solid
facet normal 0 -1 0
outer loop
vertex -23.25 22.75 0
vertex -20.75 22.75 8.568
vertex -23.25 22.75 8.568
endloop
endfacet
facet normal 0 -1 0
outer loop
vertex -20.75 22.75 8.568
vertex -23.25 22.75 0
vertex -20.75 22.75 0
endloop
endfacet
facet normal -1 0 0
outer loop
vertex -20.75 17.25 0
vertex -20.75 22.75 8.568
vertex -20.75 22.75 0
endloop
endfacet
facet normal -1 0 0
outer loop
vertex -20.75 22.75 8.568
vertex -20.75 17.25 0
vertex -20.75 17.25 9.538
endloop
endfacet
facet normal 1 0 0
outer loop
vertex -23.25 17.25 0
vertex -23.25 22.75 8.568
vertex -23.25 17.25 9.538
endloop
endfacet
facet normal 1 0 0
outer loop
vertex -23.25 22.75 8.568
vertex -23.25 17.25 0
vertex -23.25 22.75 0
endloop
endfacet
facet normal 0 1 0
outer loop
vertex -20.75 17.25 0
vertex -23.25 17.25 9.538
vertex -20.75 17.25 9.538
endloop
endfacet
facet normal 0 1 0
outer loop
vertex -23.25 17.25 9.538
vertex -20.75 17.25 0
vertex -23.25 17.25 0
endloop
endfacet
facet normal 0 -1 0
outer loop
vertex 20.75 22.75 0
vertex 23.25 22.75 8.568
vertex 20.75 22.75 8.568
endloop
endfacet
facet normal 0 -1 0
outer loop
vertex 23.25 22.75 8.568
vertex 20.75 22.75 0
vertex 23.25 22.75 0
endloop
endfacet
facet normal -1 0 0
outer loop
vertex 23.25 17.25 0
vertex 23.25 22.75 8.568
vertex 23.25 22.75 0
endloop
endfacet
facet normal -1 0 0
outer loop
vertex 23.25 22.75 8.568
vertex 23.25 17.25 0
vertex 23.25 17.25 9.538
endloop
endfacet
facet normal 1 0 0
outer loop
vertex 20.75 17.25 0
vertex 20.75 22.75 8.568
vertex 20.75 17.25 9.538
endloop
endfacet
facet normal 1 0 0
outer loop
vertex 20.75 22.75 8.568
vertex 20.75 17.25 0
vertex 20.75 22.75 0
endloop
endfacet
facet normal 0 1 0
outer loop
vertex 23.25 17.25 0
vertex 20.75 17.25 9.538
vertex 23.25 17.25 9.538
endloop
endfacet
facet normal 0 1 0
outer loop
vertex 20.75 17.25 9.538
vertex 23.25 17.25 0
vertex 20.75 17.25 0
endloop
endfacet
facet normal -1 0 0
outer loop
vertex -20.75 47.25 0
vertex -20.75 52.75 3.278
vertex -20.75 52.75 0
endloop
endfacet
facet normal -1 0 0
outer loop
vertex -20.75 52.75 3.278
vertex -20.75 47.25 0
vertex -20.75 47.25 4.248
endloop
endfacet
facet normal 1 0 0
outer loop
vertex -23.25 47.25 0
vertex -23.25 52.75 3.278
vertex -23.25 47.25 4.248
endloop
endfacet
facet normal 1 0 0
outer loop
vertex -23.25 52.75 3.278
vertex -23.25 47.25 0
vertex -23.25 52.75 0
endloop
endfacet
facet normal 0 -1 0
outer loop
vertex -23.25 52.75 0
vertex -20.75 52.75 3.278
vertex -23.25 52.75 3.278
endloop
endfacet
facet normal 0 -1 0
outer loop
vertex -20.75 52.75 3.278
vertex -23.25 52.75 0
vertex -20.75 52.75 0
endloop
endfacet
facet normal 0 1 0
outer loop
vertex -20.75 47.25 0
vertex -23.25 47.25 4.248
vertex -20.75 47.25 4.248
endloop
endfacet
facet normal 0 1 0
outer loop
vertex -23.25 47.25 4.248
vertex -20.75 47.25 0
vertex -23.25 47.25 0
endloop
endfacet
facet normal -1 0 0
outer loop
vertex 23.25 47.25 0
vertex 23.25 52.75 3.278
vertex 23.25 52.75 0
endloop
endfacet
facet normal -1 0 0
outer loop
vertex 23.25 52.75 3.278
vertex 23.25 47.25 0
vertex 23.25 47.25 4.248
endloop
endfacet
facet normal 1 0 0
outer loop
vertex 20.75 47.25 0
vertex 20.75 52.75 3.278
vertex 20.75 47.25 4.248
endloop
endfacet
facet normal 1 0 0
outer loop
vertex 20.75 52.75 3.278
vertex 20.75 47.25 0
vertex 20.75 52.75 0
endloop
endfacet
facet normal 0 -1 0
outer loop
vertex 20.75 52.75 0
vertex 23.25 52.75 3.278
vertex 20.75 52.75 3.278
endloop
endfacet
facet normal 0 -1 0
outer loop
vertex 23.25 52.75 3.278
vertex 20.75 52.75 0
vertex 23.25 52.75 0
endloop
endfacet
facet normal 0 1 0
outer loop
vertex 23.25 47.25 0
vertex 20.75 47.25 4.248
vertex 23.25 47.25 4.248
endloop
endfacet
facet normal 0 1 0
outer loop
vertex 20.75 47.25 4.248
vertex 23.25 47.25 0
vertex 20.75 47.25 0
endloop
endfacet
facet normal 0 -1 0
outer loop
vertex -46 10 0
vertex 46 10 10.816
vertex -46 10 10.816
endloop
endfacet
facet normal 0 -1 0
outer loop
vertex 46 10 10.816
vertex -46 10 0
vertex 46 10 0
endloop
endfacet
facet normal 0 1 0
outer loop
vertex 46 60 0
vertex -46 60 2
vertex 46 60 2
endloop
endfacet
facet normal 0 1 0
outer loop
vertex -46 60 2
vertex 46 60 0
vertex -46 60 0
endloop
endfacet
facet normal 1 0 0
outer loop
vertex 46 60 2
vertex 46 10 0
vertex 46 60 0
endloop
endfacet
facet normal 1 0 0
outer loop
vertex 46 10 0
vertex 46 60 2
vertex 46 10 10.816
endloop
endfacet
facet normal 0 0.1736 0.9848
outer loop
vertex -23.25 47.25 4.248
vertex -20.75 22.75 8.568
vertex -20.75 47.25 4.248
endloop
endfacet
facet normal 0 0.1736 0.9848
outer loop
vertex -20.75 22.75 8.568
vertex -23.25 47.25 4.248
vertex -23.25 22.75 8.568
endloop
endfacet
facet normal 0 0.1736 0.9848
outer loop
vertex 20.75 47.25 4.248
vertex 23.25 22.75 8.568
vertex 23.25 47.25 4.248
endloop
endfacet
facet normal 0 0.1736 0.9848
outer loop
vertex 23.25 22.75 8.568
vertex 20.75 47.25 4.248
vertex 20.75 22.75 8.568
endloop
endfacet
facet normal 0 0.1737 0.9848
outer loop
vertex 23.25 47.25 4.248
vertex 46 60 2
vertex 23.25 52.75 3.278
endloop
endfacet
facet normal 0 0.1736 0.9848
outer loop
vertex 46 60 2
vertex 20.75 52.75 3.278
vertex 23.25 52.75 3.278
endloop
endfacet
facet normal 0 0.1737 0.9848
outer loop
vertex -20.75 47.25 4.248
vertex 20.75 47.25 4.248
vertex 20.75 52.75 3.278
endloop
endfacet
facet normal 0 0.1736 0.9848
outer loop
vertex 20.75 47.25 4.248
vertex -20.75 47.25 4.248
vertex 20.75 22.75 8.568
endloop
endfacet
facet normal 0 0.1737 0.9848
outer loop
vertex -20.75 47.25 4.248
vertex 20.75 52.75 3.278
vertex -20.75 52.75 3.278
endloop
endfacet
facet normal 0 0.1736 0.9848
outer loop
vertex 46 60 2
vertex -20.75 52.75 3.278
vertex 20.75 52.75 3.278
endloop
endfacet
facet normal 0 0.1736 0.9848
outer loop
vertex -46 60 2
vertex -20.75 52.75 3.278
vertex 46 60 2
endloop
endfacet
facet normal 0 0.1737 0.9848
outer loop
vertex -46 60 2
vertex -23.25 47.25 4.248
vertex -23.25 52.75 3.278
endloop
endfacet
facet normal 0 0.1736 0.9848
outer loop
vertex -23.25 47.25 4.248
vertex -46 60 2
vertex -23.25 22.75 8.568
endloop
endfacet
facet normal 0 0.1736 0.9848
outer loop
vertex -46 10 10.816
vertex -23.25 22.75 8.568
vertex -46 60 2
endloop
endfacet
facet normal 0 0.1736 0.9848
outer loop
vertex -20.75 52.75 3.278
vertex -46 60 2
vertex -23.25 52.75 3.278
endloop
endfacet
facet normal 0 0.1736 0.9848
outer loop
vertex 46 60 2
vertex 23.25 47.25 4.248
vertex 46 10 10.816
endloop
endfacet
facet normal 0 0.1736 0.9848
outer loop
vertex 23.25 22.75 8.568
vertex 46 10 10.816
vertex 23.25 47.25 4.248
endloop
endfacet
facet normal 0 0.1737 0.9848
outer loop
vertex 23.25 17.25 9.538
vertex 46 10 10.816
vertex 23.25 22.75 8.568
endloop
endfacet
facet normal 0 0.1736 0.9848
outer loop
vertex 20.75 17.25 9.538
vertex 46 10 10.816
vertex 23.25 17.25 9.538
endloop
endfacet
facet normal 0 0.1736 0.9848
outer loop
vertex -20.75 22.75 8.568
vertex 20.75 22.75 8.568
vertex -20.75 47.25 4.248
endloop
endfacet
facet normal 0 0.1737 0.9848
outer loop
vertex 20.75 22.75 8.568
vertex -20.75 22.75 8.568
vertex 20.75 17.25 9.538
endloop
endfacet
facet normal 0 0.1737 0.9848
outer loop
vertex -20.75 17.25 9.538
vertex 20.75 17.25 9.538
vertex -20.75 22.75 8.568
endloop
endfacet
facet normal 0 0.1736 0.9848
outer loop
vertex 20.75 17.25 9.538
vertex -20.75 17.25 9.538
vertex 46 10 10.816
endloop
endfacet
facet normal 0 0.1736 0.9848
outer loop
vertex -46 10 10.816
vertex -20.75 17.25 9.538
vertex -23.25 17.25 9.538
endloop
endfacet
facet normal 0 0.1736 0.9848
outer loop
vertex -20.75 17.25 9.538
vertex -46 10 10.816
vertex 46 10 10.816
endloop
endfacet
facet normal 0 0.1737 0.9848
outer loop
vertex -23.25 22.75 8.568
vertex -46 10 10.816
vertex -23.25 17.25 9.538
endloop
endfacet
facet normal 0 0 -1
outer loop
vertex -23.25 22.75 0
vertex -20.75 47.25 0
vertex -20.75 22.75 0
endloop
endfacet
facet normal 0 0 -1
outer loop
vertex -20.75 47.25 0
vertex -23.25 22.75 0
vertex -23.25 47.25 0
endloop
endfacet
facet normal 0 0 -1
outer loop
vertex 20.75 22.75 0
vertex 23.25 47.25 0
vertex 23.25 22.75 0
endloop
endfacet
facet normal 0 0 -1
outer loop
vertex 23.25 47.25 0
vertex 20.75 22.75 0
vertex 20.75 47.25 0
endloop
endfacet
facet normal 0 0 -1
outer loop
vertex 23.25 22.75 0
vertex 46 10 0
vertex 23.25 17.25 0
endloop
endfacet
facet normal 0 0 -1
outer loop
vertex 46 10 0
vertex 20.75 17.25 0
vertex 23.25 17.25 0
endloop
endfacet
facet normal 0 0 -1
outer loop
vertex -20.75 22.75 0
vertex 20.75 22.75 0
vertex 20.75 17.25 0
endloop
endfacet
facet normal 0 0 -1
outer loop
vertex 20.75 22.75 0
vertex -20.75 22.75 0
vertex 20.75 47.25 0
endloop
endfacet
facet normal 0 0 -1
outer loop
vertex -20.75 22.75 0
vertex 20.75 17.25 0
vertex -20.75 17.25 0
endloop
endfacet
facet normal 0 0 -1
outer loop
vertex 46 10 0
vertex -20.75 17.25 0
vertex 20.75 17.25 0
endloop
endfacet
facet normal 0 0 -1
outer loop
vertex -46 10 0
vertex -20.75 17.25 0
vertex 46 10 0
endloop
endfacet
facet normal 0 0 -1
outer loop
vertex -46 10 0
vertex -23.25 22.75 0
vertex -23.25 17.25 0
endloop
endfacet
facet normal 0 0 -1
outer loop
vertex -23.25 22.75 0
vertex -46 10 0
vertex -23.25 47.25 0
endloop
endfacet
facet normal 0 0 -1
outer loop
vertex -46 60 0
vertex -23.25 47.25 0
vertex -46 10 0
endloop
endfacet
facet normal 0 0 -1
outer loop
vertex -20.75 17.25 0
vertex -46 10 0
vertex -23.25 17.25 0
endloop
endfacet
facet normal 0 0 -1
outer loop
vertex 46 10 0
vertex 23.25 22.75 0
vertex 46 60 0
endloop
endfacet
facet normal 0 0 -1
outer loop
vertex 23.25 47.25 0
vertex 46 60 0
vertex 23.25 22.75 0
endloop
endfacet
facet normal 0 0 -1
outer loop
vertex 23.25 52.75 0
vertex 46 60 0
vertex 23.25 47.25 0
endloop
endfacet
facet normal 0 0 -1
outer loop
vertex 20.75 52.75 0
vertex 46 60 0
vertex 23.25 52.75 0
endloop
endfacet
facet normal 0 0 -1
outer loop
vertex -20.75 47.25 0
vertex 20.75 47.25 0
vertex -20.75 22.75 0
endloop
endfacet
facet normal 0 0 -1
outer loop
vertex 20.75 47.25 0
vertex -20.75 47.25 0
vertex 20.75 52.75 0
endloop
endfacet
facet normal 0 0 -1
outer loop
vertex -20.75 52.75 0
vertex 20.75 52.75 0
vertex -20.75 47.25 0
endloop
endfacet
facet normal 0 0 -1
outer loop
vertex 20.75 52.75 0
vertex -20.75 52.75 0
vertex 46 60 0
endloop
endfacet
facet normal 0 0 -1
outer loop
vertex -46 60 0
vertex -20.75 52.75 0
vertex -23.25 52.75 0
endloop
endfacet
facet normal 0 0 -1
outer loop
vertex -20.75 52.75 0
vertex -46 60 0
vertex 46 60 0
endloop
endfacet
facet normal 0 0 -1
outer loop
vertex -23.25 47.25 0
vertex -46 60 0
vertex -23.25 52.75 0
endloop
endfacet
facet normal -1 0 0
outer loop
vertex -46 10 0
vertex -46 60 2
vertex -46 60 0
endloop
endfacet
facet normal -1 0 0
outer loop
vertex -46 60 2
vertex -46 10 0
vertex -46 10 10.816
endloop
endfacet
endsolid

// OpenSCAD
// file: ../sharedDims.scad
$fn=180;

/* [Printer] */
printBed            = 200;

/* [Hardware] */
m3InsertD           = 4.0;  //M3 heat-set insert hole -- check your insert's datasheet
m3InsertDepth       = 6.2;  //for a 5.7 mm long insert, plus a little for melt-back
m4InsertD           = 5.0;
m4InsertDepth       = 8.0;

/* [Shaft Adapter] */
adapterDia      = 20;
pinLatOffset    = 6;
numPins         = 2;

//overall
clDist              = 60;

/* [Hopper] */
wallThickness   = 5;
baseThickness   = 8;
hopperWidth     = 100;
hopperHeight    = 50;
hopperDepth     = 60;
hopperConvergeAngle       = 30;
dropHoleSize    = 30;
mountAngle      = 45;
//NEMA17 motor dimensions
shaftSquareDim      = 3;
shaftDia            = 5;
shaftDwidth         = 4.5;
flatLength          = 12;
motorHolePatternX   = 31;
motorHolePatternY   = 31;
motorClearanceCircle= 23;

/* [Singulator] */
singulatorDiameter      = 80;
singulatorExposureAngle = 90;
numHoles                = 4;
caseCutout              = 10;

/* [Funnel] */
topDia              = 40;
exitDia             = 20;
funnelHeight        = 30;

/* [Movable Support] */
supportScrewSize    = 6.6;
supportThickness    = 6;
cabinetWallThk      = 6;  //cabinet faces (ply or print); the servo mount bolts to the inside of the left panel
cornerBlock         = 20; //printed blocks in the cabinet's vertical corners -- at the base, the tile seam and
                          //the top; every wall screws into them
tileLap             = 16; //where a printed wall's two tiles meet: a half-lap this tall, glued and screwed

//MG90S servo -- typical numbers, measure yours
servoBodyL          = 22.8; //case length, along the ears
servoBodyW          = 12.2;
servoBodyH          = 22.7; //case bottom to case top, not counting the output boss
servoShaftToEnd     = 6.1;  //output shaft centre to the short end of the case
servoEarSpan        = 32.2; //tip to tip of the mounting ears
servoEarHolePitch   = 27.8;
servoEarThk         = 2.5;
servoEarDrop        = 4.0;  //case top down to the top face of the ears
servoWallClear      = 1.2;  //air between the servo's wall-side ear and the inside of the cabinet wall
servoEarsToArm      = 13.5; //measured: the servo mount's top face (the ears' underside) up to the arm's underside, horn on
//distance from the outside wall of the box to the servo's axis: the wall, then as far as the
//wall-side ear reaches from the shaft (half the ear span, less the case centre's offset
//behind the shaft), then the clearance. It has to come after the servo numbers it uses.
servoBackset        = cabinetWallThk + (servoEarSpan/2 - (servoBodyL/2 - servoShaftToEnd)) + servoWallClear;

//stack spacing down the drop axis
dropToFunnelRim     = 18;   //discharge exit down to the funnel's top rim
funnelToCoil        = 15;   //funnel exit down to the centre of the coil
maxCaseLen          = 69.2; //the longest case it takes (.338 Lapua Mag); shorter ones ride up the thumbscrew
funnelToCase        = maxCaseLen + 7;   //funnel exit down to the thumbscrew head at its lowest: the longest
                                        //case, with its mouth clear of the funnel
caseToArm           = 16;   //thumbscrew head at its lowest down to the top face of the horn arm

/* [Heatsink Holder] */
//induction heater heatsinks -- the pair on the heatsink holder, inside the cabinet; the coil's
//leads come through the wall and plug into them, and the transformer's cables leave the far end
heatsinkSpacing     = 20;   //between their flat faces: the holder's width across them
heatsinkH           = 54;   //overall, across the fins
heatsinkFinReach    = 5.25; //the fins stand this far proud of the flat face, toward the holder
heatsinkDepth       = 18.5; //flat face out to the back of the curved base (round, not square -- see layout)
heatsinkLen         = 38;   //extrusion length, the same as the holder
heatsinkBoreIn      = 7;    //the coil's lead plugs in this far in from the flat face, at mid-height

//the driver board's fan -- a standard 40 x 20
driverFanSize       = 40;   //square
driverFanDepth      = 20;
driverFanHolePitch  = 32;   //between its screw holes (M3)

//induction coil leads, where they pass through the cabinet wall
coilTube            = 4;    //copper tube OD
leadGap             = heatsinkSpacing + 2*heatsinkBoreIn;   //centre-to-centre: the heatsinks' lead bores
grommetLip          = 2.5;  //the pass-through is grown by this for the grommet
wallBackset         = 0; 
// file: transformerCradle.scad
include <../sharedDims.scad>

// Cradle for the harvested heater's transformer: a bridge over the driver
// board. A slab lies under the transformer, its top face along the
// transformer's underside, on a leg either side of the board down to the
// cabinet floor, where M3 screws come up into heat-set inserts in the feet.
// Two zip ties go over the transformer and down through the slab either
// side of it; snug slots keep them from sliding, and they're all that holds
// the transformer along its slope.
//
// The shim: the cradle was drawn for a shallower transformer. To steepen it
// without reprinting, a wedge on the slab tips it on to shimTilt, the tie
// slots running through both. Its own part is transformerShim.scad.
//
// Prints on the slab's top face: the slab spans leg to leg within its
// layers, and the legs are walls carrying the load straight down. Their
// edges lean 45 deg; the tie slots come out vertical.
//
// Frame: X front to back as in the assembly, but centred on the
// transformer's axis; Y to the right, along its run; Z up. The origin is on
// the floor under the centre of its left (upper) end face. Everything under
// "keep in step" has to match cad/cabinet/boxLayout.scad, which checks it.

/* [Transformer and board -- keep in step with boxLayout.scad] */
xfmrD      = 63.5;  // transformer diameter...
xfmrLen    = 90;    // ...and length
tilt       = 15;    // its axis, below horizontal
endH       = 101;   // its axis above the floor, at its left (upper) end face
boardTopH  = 44;    // the driver board's top above the floor (it lies under the transformer)...
boardHalfW = 22;    // ...and its farther edge from the axis

/* [Cradle] */
slabT     = 8;
slabFrom  = 10;     // along the transformer from its left end...
slabTo    = 60;     // ...to here, where the legs end -- any further and the slab drops onto the board
legTo     = 60;     // the legs carry the slab this far along (no further than slabTo)
legX      = [38, 46];   // each leg, off the axis
footLen   = 45;     // along Y, on the floor

/* [Shim -- keep shimTilt in step with boxLayout.scad's xfmrDown] */
shimTilt  = 25;     // the transformer's axis on the shim, below horizontal
shimThin  = 2;      // the wedge at its lower end

/* [Zip ties] */
tieW      = 5.5;    // slot along the transformer, for ties up to ~4.8 wide (a tie over the
tieT      = 2.5;    // transformer lies flat on it)... and across, for ties up to ~1.3 thick
tieAt     = [20, 50];   // along the transformer from its left end -- on the slab, 10 in from each end
tieX      = 22;     // either side of the axis

r = xfmrD/2;
slabLow = endH - slabTo*sin(tilt) - (r + slabT)*cos(tilt);   // the slab's lowest point, above the floor
assert(slabLow >= boardTopH + 3, "the slab drops onto the driver board");
assert(endH - xfmrLen*sin(tilt) - r*cos(tilt) >= boardTopH + 3, "the transformer's lower end drops onto the driver board");
assert(legTo <= slabTo, "the legs run past the slab");
assert(min(tieAt) - tieW/2 >= slabFrom + 3 && max(tieAt) + tieW/2 <= slabTo - 3, "the zip tie slots run off the slab");
assert(legX[0] >= boardHalfW + 2, "the legs run into the driver board");
assert(legX[0] > r + 2, "the legs run into the transformer");
// the feet, along Y: centred under the legs' stretch of the slab
footMidY = ((slabFrom + legTo)/2)*cos(tilt) - (r + slabT/2)*sin(tilt);

//for the assembly: what the cradle was drawn for, and where its feet's screws go (x, y)
function transformerCradleFit() = [xfmrD, xfmrLen, tilt, endH, boardTopH, boardHalfW];
//...the shim's angle and thin end, and where the middle of the transformer's upper
//end lands on it, its middle over the shim's middle: [y, z] in the cradle's frame
function transformerShimFit() = [shimTilt, shimThin];
function shim_top(y) = -r + shimThin + (slabTo - y)*tan(shimTilt - tilt);   // the shim's top, up off the slab's, in the axis frame
function axis_yz(p) = [p[0]*cos(tilt) + p[1]*sin(tilt), -p[0]*sin(tilt) + p[1]*cos(tilt) + endH];
function transformerOnShim() =
    let (ym = (slabFrom + slabTo)/2,
         m  = axis_yz([ym, shim_top(ym)]),                 // the shim's top, halfway along
         n  = [sin(shimTilt), cos(shimTilt)],              // square off it, up
         d  = [cos(shimTilt), -sin(shimTilt)])             // down its slope
    m + r*n - (xfmrLen/2)*d;
assert(shimTilt >= tilt, "the shim can only steepen the transformer");
function transformerCradleFootHoles() =
    [for (s = [1, -1], y = [-1, 1]) [s*(legX[0] + legX[1])/2, footMidY + y*(footLen/2 - 7)]];

// the transformer's frame: X across, Y along its axis from the left end face,
// Z square to both (up, away from the underside); it occupies |(x, z)| <= r
module axis_frame() {
    multmatrix([[1, 0,          0,          0],
                [0, cos(tilt),  sin(tilt),  0],
                [0, -sin(tilt), cos(tilt),  endH],
                [0, 0,          0,          1]]) children();
}

module slab(x0, x1, t1 = slabTo) { axis_frame() translate([x0, slabFrom, -r - slabT]) cube([x1 - x0, t1 - slabFrom, slabT]); }

module transformerCradle() {
    difference() {
        union() {
            slab(-legX[1], legX[1]);
            //legs: the slab's ends, down to the floor
            for (s = [1, -1]) mirror([s < 0 ? 1 : 0, 0, 0]) hull() {
                slab(legX[0], legX[1], legTo);
                translate([legX[0], footMidY - footLen/2, 0]) cube([legX[1] - legX[0], footLen, 1]);
            }
        }
        //zip tie slots, through the slab either side of the transformer
        for (y = tieAt, x = [-tieX, tieX])
            axis_frame() translate([x - tieT/2, y - tieW/2, -r - slabT - 1]) cube([tieT, tieW, slabT + 2]);
        //M3 heat-set inserts up into the feet, for screws from under the floor
        for (h = transformerCradleFootHoles())
            translate([h[0], h[1], -1]) cylinder(d=m3InsertD, h=m3InsertDepth + 1, $fn=24);
    }
}

// The shim, on the slab, in the cradle's frame: a wedge the slab's width and
// length, thin at the lower end, with the tie slots through it.
module transformerShim() {
    difference() {
        axis_frame() multmatrix([[0, 0, 1, -legX[1]], [1, 0, 0, 0], [0, 1, 0, 0], [0, 0, 0, 1]])
            linear_extrude(height = 2*legX[1])
                polygon([[slabFrom, -r], [slabTo, -r], [slabTo, shim_top(slabTo)], [slabFrom, shim_top(slabFrom)]]);
        for (y = tieAt, x = [-tieX, tieX])
            axis_frame() translate([x - tieT/2, y - tieW/2, -r - 1]) cube([tieT, tieW, shim_top(slabFrom) + r + 2]);
    }
}

// Laid for printing: on its bottom face (the one on the slab).
module transformerShim_print() {
    translate([0, 0, r])
        multmatrix([[1, 0, 0, 0], [0, cos(tilt), -sin(tilt), 0], [0, sin(tilt), cos(tilt), 0], [0, 0, 0, 1]])
            translate([0, 0, -endH]) transformerShim();
}

// Laid for printing: on the slab's top face, the legs straight up.
module transformerCradle_print() {
    translate([0, 0, -r]) rotate([180, 0, 0])
        multmatrix([[1, 0, 0, 0], [0, cos(tilt), -sin(tilt), 0], [0, sin(tilt), cos(tilt), 0], [0, 0, 0, 1]])
            translate([0, 0, -endH]) transformerCradle();
}

transformerCradle_print();
// main file
use <transformerCradle.scad>

// Wedge shim for the transformer's cradle: it sits on the cradle's slab and
// tips the transformer from the angle the cradle was drawn for on to a
// steeper one (shimTilt), the zip ties running through both. Its numbers live
// in transformerCradle.scad, next to the cradle's.
//
// Prints on its bottom face, the one that sits on the slab.

transformerShim_print();
